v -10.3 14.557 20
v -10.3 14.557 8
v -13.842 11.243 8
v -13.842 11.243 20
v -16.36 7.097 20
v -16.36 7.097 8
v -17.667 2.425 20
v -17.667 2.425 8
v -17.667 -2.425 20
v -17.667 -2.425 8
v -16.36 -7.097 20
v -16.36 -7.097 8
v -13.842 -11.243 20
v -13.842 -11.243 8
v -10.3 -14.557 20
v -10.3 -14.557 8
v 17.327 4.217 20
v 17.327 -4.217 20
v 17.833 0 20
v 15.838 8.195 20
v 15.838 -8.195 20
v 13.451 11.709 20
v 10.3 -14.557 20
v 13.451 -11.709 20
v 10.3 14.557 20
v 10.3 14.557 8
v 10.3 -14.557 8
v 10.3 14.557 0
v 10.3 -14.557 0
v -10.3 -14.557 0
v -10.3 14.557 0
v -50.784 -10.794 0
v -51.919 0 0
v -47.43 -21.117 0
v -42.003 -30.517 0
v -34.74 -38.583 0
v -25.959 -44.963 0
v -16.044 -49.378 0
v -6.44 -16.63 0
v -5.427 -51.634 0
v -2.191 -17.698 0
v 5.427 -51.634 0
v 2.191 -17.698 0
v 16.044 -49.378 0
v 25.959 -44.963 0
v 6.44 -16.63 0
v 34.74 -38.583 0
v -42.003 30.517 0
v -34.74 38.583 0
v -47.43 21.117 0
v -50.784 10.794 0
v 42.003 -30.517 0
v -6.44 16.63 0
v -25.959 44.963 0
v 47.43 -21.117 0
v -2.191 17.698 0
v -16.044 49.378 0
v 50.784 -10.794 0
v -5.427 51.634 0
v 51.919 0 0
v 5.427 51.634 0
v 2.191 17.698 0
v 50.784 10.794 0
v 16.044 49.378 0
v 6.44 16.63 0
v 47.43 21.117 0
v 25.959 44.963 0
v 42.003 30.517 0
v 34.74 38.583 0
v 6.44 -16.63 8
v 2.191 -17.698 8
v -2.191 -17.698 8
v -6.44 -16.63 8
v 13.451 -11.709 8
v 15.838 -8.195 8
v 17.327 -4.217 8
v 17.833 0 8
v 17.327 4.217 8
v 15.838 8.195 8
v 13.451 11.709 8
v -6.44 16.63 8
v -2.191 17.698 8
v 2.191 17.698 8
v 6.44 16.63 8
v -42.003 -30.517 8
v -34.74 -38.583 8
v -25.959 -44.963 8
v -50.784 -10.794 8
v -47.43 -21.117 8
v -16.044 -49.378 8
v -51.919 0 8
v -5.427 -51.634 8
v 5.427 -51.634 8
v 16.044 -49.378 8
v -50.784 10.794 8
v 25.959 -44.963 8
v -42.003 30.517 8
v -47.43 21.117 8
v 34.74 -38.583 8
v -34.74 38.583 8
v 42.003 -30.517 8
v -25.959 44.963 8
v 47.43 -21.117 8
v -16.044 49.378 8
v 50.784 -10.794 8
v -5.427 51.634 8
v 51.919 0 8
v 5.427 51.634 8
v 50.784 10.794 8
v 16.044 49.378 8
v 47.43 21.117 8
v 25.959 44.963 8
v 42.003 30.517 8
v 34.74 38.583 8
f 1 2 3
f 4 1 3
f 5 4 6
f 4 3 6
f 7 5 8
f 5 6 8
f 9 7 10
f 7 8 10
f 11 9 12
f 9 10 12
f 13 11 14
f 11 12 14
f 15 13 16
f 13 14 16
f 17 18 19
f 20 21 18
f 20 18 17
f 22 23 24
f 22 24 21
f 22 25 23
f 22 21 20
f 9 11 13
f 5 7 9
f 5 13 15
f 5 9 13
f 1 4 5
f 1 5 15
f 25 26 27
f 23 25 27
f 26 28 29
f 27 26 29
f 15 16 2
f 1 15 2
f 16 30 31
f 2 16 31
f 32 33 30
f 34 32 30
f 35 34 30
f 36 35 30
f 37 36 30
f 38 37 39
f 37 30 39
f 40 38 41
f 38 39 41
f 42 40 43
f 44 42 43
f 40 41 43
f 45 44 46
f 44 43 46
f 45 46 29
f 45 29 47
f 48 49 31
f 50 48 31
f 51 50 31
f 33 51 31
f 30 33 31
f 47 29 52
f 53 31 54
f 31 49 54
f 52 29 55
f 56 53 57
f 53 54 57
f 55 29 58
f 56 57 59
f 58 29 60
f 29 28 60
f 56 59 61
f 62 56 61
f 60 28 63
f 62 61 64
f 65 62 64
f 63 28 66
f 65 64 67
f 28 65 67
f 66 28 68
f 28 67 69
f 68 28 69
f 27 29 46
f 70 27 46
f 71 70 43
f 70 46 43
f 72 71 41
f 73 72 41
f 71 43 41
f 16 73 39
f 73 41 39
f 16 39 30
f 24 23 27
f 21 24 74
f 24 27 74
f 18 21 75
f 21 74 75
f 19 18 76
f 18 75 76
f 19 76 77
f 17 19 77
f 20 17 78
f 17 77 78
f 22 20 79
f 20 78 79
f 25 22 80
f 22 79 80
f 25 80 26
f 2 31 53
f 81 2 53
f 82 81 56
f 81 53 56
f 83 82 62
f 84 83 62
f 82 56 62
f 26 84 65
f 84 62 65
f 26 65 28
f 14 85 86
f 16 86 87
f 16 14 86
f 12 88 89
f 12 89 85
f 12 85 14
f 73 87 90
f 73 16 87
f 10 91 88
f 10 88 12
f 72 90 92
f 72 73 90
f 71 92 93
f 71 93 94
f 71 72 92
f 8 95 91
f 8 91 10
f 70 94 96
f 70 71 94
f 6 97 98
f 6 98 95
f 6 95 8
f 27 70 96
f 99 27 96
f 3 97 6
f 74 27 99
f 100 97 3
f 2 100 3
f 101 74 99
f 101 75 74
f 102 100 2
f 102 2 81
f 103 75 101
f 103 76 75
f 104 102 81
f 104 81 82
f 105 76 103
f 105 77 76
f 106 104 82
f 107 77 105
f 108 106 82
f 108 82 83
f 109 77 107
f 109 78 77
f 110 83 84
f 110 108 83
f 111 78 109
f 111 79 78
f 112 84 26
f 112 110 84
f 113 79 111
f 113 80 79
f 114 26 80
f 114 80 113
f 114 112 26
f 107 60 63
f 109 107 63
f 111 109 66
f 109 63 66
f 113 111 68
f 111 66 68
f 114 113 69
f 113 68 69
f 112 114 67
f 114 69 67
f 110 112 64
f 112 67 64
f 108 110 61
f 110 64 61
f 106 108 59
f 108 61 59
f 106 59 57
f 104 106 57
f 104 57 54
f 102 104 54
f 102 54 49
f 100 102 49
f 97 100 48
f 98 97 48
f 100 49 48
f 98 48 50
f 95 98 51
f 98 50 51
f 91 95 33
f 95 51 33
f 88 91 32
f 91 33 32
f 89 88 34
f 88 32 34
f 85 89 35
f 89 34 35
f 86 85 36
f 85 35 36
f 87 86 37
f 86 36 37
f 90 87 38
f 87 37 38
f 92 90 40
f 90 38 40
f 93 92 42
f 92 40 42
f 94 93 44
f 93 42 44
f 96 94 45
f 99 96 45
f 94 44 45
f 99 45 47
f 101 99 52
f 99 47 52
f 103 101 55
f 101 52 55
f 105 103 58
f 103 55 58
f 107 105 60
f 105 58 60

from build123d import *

# Parameters (mm, degrees)
F0_R     = 51.918659
F1_DEPTH = 8
F2_DEPTH = 20


with BuildPart() as f1:
    # F0 (on Top) → F1 (new body)
    with BuildSketch(Plane.XY):
        Circle(F0_R)
        with BuildLine():
            ThreePointArc((10.300017, 14.557494), (15.838083, 8.195493), (17.832863, 0))
            ThreePointArc((17.832863, 0), (15.838083, -8.195493), (10.300017, -14.557494))
            ThreePointArc((10.300017, -14.557494), (0, -17.832863), (-10.300017, -14.557494))
            ThreePointArc((-10.300017, -14.557494), (-17.832863, 0), (-10.300017, 14.557494))
            ThreePointArc((-10.300017, 14.557494), (0, 17.832863), (10.300017, 14.557494))
        make_face(mode=Mode.SUBTRACT)
        with BuildLine():
            Line((-10.300017, -14.557494), (-10.300017, 14.557494))
            ThreePointArc((-10.300017, 14.557494), (-17.832863, 0), (-10.300017, -14.557494))
        make_face()
        with BuildLine():
            ThreePointArc((10.300017, -14.557494), (15.838083, -8.195493), (17.832863, 0))
            ThreePointArc((17.832863, 0), (15.838083, 8.195493), (10.300017, 14.557494))
            Line((10.300017, 14.557494), (10.300017, -14.557494))
        make_face()
    extrude(amount=F1_DEPTH)

    # F0 (on Top) → F2 (join)
    with BuildSketch(Plane.XY):
        with BuildLine():
            Line((-10.300017, -14.557494), (-10.300017, 14.557494))
            ThreePointArc((-10.300017, 14.557494), (-17.832863, 0), (-10.300017, -14.557494))
        make_face()
        with BuildLine():
            ThreePointArc((10.300017, -14.557494), (15.838083, -8.195493), (17.832863, 0))
            ThreePointArc((17.832863, 0), (15.838083, 8.195493), (10.300017, 14.557494))
            Line((10.300017, 14.557494), (10.300017, -14.557494))
        make_face()
    extrude(amount=F2_DEPTH)


solid = f1.part
